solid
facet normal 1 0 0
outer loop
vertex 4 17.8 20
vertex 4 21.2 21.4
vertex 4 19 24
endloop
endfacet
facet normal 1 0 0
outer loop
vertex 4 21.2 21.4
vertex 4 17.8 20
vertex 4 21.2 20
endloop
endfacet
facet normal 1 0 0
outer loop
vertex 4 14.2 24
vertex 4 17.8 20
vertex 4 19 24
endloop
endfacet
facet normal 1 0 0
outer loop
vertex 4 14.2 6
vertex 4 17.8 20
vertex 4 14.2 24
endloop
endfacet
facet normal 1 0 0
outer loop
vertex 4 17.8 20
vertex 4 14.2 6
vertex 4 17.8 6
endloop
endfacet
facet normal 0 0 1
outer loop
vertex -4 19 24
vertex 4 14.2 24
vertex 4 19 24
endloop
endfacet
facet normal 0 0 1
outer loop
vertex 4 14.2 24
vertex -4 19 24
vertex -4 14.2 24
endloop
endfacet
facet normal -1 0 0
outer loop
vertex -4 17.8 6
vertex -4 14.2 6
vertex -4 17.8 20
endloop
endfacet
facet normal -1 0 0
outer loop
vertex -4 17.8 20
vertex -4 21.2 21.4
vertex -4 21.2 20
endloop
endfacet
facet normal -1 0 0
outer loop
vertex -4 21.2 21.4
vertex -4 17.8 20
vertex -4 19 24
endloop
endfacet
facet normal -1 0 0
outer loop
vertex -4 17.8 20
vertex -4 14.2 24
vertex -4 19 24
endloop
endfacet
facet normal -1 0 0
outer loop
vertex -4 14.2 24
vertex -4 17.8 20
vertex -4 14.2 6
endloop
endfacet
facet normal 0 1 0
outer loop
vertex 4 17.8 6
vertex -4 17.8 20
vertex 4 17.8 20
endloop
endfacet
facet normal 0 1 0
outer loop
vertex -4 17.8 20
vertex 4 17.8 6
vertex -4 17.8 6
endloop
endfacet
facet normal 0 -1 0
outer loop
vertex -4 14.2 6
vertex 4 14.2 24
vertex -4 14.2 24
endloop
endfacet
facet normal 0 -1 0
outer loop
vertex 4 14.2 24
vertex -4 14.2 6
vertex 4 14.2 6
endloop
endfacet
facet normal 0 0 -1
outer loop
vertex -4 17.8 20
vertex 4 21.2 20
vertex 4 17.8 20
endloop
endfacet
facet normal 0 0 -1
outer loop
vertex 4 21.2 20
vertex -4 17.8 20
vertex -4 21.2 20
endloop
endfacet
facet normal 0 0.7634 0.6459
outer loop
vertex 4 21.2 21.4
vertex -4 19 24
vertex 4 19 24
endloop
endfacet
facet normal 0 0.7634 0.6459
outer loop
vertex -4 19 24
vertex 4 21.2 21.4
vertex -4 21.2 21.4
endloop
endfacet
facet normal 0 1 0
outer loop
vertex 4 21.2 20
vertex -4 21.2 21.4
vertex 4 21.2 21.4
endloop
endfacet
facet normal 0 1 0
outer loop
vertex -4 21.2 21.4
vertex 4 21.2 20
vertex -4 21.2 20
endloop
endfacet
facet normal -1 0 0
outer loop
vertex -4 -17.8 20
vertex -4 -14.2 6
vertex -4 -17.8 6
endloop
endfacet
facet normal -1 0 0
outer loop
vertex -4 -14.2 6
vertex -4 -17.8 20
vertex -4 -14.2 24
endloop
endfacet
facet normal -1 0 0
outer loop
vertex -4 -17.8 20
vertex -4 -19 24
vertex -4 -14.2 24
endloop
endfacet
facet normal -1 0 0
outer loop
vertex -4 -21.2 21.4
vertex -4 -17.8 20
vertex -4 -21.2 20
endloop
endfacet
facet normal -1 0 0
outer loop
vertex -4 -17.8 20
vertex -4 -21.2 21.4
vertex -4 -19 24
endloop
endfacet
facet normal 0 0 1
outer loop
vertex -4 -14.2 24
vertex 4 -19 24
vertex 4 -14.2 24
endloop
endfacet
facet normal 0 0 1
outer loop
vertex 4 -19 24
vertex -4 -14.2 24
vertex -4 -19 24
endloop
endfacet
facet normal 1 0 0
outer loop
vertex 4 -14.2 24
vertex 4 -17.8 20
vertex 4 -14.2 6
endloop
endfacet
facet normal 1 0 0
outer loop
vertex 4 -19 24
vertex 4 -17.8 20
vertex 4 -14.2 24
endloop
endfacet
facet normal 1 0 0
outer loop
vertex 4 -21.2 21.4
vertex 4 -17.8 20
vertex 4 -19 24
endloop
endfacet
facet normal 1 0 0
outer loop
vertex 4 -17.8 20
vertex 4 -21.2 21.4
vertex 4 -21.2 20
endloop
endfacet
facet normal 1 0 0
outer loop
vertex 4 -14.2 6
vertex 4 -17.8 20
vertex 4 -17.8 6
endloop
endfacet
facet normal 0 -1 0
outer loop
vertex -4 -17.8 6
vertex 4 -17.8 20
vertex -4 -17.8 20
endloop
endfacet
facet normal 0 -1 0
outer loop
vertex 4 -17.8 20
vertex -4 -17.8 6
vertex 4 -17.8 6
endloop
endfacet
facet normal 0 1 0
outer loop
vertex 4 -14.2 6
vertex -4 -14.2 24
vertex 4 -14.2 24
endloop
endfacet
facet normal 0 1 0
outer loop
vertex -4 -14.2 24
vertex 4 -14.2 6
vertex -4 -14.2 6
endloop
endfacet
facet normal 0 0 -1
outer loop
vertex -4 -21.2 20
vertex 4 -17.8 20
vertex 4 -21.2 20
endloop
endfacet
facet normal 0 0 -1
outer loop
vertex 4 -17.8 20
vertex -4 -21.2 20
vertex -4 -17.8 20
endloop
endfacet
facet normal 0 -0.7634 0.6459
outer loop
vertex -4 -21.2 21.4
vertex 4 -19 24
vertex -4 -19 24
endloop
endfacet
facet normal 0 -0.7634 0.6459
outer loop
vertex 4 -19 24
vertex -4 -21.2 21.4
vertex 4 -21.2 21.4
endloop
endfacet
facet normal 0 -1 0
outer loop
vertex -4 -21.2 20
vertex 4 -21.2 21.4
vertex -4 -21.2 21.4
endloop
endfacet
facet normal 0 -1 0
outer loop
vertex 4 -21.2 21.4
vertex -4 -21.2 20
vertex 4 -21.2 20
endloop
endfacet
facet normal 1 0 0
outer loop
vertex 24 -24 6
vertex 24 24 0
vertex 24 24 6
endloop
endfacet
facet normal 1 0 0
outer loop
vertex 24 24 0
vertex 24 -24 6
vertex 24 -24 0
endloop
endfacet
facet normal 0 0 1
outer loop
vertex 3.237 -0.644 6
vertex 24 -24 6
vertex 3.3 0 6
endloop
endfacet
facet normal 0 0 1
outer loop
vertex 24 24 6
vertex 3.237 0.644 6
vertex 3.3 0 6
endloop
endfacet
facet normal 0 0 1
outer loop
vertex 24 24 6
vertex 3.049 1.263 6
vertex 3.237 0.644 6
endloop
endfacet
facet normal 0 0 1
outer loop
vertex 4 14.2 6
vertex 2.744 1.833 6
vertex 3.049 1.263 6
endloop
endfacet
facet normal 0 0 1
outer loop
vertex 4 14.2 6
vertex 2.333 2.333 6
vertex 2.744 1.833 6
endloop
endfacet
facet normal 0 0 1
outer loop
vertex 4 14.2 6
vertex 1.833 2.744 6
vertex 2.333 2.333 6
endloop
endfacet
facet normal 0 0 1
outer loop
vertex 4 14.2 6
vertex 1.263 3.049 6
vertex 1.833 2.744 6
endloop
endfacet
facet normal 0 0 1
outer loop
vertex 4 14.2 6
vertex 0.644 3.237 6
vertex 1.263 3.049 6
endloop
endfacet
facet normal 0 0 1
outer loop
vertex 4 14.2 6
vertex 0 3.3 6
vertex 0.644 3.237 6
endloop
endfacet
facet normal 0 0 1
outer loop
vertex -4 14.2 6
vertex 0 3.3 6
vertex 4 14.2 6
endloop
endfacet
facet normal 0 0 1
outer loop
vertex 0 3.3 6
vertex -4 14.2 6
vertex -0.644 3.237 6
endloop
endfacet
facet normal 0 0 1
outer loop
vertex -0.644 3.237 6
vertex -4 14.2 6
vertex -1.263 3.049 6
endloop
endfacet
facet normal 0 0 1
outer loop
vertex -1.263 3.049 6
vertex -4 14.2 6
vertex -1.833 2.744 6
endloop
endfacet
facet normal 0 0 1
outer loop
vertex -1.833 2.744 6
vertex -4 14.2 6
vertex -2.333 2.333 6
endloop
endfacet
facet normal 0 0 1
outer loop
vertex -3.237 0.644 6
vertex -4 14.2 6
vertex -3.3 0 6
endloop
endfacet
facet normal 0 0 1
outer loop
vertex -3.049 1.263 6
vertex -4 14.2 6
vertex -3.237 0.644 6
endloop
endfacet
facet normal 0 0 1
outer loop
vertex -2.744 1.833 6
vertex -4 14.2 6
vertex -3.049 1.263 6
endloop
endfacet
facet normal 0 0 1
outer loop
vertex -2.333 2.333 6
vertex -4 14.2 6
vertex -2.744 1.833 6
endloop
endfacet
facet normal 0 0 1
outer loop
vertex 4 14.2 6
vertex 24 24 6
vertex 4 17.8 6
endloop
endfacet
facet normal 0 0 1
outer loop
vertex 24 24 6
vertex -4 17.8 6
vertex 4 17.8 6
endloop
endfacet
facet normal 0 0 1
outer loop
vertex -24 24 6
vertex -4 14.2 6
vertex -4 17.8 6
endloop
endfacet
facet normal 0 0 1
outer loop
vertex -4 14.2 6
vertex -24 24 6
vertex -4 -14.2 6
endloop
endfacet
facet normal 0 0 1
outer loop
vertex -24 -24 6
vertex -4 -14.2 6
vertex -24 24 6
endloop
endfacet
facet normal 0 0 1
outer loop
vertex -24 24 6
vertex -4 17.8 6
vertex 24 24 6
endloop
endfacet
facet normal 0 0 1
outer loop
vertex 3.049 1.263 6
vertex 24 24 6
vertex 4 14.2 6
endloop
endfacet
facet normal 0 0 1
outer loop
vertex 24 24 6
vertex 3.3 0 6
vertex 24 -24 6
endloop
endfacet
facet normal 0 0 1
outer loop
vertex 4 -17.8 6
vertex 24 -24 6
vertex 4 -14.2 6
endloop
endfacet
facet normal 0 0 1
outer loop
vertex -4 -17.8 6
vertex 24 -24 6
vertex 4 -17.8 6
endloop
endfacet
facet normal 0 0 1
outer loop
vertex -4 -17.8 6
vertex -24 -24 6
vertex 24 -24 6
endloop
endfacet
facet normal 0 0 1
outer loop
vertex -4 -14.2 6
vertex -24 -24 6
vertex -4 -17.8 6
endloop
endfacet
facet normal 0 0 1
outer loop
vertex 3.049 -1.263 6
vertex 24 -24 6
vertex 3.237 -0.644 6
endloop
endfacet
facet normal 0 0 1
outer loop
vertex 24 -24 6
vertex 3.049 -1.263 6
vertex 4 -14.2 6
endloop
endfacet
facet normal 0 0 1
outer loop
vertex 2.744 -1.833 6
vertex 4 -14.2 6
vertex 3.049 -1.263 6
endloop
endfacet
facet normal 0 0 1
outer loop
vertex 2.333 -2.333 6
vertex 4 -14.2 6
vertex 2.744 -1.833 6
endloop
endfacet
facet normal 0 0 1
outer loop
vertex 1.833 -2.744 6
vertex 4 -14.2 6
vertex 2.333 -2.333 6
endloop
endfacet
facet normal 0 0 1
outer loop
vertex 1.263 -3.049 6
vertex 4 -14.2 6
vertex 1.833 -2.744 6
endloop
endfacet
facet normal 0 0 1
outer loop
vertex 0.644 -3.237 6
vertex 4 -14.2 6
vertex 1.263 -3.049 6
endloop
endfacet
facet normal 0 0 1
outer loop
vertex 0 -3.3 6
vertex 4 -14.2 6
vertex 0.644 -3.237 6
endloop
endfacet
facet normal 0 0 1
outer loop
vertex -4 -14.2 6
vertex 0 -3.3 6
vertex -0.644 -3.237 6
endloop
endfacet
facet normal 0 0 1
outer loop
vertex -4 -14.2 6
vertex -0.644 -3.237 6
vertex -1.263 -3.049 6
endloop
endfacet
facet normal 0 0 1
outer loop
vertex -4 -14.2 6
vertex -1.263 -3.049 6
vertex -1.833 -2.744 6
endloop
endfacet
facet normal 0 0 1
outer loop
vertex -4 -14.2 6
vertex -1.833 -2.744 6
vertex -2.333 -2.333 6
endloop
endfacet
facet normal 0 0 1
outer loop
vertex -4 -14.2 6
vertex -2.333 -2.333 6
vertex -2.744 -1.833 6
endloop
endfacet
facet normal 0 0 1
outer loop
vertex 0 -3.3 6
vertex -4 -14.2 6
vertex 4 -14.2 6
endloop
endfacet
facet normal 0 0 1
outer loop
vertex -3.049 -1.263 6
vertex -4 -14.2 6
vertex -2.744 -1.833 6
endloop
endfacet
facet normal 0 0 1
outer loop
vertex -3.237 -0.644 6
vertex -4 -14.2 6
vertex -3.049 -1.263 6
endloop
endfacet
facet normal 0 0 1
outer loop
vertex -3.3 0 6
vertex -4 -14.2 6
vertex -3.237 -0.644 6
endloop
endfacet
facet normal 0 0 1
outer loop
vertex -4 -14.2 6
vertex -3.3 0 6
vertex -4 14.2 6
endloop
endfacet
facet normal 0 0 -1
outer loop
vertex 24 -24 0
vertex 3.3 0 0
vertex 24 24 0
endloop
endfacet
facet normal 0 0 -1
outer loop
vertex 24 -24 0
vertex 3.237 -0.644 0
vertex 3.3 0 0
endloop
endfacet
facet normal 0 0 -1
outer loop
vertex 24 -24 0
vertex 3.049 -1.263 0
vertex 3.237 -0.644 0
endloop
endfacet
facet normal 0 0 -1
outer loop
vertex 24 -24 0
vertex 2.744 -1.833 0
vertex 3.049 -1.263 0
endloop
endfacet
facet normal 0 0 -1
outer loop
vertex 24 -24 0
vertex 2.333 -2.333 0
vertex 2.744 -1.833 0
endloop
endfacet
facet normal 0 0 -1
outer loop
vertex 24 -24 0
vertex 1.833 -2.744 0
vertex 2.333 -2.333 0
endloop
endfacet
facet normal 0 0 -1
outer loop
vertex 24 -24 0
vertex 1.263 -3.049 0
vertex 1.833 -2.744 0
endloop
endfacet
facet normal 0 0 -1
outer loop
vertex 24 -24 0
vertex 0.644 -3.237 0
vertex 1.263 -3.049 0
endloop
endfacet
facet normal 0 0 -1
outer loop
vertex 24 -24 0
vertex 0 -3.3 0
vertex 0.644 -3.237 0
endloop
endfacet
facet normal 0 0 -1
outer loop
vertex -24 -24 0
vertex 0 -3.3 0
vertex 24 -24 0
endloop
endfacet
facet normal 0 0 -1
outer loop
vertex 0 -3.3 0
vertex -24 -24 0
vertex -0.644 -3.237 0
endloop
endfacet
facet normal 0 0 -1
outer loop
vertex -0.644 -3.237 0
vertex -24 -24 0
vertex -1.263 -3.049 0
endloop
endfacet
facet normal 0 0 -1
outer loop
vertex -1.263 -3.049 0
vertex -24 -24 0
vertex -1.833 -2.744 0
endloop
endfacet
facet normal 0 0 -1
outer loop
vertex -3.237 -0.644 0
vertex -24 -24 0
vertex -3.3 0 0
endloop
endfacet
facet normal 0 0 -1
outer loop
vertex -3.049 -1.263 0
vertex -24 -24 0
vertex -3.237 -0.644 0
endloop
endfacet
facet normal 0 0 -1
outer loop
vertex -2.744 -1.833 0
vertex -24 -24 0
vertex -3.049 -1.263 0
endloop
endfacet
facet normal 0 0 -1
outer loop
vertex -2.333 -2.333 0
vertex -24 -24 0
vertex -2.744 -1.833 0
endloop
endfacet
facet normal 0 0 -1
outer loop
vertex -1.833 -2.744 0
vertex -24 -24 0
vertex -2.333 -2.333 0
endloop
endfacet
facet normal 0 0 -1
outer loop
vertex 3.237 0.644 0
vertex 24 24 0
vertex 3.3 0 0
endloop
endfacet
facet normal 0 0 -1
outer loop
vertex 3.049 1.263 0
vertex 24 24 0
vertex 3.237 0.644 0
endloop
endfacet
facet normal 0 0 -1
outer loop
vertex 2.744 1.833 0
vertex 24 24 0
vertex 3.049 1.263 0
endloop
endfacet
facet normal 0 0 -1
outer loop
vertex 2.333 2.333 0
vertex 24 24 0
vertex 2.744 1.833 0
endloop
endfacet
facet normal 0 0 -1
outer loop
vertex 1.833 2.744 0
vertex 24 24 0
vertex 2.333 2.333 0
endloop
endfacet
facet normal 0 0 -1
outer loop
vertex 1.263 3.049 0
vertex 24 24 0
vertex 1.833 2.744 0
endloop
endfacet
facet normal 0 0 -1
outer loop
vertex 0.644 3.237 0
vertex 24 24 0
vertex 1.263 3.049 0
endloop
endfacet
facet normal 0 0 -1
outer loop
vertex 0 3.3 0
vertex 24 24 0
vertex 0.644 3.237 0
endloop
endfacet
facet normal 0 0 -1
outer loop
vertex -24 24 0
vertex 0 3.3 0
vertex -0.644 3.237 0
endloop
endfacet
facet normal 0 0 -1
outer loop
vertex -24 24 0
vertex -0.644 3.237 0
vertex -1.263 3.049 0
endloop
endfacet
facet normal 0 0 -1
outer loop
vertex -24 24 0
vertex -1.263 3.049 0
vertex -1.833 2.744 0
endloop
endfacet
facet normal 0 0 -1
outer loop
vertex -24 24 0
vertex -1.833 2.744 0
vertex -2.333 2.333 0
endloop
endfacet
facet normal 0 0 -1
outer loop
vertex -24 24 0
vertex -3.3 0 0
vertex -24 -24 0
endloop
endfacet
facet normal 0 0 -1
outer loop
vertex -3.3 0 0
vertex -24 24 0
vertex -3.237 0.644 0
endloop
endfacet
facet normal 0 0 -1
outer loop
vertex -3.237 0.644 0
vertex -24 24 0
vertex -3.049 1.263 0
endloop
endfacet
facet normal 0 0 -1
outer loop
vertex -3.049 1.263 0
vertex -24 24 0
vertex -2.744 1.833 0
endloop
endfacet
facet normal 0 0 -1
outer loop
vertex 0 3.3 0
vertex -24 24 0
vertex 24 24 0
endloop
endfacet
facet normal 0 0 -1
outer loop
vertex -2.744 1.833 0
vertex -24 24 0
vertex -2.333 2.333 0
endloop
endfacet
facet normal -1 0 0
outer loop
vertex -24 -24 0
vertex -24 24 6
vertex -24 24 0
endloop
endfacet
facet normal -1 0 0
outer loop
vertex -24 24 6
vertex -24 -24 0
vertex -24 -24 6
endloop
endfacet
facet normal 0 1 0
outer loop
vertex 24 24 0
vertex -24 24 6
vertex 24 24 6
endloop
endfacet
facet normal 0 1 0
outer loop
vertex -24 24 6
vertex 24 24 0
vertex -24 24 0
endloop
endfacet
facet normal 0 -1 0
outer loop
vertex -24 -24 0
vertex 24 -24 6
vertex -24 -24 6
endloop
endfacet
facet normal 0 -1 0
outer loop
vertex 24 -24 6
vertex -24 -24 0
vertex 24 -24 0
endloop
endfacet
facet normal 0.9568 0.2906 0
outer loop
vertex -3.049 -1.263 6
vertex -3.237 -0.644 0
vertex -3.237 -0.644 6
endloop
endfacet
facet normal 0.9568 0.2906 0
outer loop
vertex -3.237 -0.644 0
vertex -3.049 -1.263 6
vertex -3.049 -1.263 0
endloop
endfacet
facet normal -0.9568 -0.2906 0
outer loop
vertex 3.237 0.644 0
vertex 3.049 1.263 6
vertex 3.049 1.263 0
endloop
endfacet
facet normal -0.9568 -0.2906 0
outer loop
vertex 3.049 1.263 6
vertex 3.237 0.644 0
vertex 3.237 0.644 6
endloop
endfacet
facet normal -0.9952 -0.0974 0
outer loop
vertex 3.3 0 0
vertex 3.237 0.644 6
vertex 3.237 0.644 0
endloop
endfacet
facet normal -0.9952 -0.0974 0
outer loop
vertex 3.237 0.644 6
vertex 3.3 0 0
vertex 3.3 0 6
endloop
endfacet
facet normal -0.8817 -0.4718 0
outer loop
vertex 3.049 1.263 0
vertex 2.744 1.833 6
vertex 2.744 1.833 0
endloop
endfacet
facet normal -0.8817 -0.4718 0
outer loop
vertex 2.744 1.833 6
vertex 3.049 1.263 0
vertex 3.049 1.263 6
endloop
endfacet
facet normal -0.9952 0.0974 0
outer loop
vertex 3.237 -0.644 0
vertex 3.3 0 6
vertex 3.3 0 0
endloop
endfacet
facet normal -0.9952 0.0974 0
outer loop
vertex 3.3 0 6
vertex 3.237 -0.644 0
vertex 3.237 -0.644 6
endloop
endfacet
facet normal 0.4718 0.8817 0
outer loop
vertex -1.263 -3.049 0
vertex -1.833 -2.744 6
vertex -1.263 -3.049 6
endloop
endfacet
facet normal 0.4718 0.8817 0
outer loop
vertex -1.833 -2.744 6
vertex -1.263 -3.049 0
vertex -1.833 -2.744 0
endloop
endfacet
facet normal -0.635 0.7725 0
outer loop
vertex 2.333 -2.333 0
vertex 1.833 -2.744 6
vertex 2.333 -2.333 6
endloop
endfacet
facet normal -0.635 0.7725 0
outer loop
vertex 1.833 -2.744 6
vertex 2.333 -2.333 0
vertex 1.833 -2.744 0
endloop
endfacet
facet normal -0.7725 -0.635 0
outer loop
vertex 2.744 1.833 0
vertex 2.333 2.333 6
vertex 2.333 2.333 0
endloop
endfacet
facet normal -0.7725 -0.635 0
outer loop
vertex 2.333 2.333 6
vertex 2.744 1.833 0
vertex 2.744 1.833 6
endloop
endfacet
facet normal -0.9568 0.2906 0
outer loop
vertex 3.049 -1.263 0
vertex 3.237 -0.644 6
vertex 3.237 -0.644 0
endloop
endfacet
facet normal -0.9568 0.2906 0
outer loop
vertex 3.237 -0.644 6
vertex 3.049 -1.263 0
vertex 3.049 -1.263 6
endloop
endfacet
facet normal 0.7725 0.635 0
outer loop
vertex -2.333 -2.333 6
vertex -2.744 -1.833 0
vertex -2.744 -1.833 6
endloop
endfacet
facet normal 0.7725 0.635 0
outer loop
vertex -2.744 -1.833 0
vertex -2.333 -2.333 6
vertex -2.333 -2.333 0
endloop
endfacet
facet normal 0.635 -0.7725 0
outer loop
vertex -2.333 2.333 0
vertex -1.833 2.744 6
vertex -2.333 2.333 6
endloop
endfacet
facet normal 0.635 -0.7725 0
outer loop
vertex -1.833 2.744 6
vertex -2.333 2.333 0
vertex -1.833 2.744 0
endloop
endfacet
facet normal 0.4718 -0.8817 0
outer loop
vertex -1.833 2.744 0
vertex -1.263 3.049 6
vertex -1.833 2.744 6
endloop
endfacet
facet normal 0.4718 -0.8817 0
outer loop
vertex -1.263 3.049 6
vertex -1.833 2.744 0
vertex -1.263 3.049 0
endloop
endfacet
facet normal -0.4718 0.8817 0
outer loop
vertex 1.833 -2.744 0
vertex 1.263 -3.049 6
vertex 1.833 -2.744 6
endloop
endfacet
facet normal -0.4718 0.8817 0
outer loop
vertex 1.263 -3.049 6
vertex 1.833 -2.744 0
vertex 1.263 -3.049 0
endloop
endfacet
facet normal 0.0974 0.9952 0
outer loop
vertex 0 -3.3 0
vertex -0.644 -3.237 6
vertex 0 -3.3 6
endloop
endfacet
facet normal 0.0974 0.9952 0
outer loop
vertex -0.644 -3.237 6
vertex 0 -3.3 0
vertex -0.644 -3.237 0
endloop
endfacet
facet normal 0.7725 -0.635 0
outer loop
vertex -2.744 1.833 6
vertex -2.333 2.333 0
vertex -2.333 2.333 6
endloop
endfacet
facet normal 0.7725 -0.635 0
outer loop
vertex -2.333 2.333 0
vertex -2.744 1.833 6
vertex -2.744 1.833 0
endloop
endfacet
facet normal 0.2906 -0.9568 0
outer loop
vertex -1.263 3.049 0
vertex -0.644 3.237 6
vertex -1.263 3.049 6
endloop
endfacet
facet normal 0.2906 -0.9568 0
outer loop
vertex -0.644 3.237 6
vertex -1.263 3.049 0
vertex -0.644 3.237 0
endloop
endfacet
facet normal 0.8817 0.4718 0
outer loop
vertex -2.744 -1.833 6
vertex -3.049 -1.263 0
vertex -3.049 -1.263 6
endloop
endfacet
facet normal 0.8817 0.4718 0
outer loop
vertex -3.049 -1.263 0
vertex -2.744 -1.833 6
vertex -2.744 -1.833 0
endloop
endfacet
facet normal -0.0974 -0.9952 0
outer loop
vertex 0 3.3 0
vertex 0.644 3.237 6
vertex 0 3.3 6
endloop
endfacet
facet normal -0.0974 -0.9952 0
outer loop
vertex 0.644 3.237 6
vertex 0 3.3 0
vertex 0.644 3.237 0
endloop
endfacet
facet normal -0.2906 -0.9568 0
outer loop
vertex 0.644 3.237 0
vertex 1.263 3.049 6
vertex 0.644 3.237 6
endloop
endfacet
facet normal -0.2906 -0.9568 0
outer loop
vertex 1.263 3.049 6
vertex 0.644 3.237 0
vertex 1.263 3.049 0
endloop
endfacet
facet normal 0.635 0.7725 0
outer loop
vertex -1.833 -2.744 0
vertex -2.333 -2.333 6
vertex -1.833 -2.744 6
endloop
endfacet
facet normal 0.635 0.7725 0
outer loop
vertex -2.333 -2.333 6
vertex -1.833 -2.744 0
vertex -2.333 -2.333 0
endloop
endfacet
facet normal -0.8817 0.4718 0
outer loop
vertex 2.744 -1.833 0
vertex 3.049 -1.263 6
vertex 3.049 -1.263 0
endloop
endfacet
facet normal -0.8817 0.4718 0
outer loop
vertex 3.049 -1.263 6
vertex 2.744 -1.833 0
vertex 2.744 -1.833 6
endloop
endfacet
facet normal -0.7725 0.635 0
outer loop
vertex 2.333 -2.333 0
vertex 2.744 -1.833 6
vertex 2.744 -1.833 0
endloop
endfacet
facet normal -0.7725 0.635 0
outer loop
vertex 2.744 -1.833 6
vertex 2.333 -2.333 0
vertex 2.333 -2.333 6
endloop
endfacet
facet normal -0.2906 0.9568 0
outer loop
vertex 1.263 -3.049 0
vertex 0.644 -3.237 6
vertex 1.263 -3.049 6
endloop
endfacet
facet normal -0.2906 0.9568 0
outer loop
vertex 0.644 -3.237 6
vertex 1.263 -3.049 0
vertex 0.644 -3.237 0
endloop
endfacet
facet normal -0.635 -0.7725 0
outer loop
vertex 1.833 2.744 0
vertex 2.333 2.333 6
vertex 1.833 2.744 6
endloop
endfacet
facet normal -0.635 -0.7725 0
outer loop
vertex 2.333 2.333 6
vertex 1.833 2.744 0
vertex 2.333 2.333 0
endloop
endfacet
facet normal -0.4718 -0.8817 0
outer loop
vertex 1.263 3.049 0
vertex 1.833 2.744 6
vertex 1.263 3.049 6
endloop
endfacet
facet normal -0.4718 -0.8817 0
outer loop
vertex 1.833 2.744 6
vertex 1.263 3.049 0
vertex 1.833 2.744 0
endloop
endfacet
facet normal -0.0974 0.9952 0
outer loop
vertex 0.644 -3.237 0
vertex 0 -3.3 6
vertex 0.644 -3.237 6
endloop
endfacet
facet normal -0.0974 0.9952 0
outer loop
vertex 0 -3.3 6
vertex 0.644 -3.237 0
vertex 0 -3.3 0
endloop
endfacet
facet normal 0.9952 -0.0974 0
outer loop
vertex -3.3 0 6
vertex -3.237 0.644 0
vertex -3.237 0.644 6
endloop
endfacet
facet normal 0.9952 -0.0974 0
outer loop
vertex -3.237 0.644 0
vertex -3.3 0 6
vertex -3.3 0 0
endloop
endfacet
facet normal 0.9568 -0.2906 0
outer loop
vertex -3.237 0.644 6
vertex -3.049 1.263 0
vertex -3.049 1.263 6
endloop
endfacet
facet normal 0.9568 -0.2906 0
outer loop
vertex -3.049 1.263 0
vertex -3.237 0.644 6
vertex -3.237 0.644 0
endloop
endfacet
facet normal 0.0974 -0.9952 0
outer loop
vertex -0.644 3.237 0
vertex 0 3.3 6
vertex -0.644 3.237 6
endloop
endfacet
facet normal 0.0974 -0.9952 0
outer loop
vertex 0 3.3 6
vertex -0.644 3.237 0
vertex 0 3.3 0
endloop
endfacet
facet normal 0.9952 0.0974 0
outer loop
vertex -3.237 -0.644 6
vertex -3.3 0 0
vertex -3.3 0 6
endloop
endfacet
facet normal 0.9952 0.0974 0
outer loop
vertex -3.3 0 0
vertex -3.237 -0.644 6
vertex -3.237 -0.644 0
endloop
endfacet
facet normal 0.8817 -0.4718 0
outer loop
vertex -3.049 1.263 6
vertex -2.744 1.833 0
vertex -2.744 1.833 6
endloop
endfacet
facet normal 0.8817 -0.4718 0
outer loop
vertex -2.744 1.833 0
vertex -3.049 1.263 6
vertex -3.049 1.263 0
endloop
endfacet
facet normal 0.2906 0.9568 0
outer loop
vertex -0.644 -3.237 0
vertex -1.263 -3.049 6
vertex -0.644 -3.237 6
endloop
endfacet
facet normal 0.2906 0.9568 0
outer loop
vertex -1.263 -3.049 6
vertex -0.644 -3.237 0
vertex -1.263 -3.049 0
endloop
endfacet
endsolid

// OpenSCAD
$fn = 32;

// ----------------------------------------------------------------------
// Snap-fit latch: 2 arms, 18 mm tall, 3.6 mm undercut hooks
// ----------------------------------------------------------------------

// --- parameters (mm) ---
base_d = 48;              // base plate depth
base_h = 6;               // base plate thickness
span = 32;                // distance between opposite arms
arm_t = 3.6;              // arm thickness
arm_d = 8;                // arm width
height = 18;              // free arm length
head_len = 3.6;           // hook reach
head_h = 4;               // hook height
lead = 1.4;               // lead-in ramp thickness
bore_d = 6.6;             // base fixing bore
top_z = 24;               // height of the arm tips above the base

arms = 2;

difference() {
  union() {
    /* base plate, centred on the arm ring */
    translate([-24, -24, 0]) cube([base_d, base_d, base_h]);
    for (a = [0 : 360 / arms : 359]) rotate([0, 0, a]) {
    /* arm, sunk 0.5 mm into the base */
    translate([-arm_d / 2, span / 2 - arm_t / 2, base_h - 0.5]) cube([arm_d, arm_t, height + 0.5]);
    /* hook: a convex hull of a tall inner block and a thin outer lip
       gives a flat undercut below and a lead-in ramp on top */
    hull() {
      translate([-arm_d / 2, span / 2 + arm_t / 2 - 0.6, top_z - head_h]) cube([arm_d, lead + 0.4, head_h]);
      translate([-arm_d / 2, span / 2 + arm_t / 2 - 0.2, top_z - head_h]) cube([arm_d, head_len, lead]);
    }
    }
  }
  translate([0, 0, -2.5]) cylinder(h = base_h + 5, d = bore_d);
}
